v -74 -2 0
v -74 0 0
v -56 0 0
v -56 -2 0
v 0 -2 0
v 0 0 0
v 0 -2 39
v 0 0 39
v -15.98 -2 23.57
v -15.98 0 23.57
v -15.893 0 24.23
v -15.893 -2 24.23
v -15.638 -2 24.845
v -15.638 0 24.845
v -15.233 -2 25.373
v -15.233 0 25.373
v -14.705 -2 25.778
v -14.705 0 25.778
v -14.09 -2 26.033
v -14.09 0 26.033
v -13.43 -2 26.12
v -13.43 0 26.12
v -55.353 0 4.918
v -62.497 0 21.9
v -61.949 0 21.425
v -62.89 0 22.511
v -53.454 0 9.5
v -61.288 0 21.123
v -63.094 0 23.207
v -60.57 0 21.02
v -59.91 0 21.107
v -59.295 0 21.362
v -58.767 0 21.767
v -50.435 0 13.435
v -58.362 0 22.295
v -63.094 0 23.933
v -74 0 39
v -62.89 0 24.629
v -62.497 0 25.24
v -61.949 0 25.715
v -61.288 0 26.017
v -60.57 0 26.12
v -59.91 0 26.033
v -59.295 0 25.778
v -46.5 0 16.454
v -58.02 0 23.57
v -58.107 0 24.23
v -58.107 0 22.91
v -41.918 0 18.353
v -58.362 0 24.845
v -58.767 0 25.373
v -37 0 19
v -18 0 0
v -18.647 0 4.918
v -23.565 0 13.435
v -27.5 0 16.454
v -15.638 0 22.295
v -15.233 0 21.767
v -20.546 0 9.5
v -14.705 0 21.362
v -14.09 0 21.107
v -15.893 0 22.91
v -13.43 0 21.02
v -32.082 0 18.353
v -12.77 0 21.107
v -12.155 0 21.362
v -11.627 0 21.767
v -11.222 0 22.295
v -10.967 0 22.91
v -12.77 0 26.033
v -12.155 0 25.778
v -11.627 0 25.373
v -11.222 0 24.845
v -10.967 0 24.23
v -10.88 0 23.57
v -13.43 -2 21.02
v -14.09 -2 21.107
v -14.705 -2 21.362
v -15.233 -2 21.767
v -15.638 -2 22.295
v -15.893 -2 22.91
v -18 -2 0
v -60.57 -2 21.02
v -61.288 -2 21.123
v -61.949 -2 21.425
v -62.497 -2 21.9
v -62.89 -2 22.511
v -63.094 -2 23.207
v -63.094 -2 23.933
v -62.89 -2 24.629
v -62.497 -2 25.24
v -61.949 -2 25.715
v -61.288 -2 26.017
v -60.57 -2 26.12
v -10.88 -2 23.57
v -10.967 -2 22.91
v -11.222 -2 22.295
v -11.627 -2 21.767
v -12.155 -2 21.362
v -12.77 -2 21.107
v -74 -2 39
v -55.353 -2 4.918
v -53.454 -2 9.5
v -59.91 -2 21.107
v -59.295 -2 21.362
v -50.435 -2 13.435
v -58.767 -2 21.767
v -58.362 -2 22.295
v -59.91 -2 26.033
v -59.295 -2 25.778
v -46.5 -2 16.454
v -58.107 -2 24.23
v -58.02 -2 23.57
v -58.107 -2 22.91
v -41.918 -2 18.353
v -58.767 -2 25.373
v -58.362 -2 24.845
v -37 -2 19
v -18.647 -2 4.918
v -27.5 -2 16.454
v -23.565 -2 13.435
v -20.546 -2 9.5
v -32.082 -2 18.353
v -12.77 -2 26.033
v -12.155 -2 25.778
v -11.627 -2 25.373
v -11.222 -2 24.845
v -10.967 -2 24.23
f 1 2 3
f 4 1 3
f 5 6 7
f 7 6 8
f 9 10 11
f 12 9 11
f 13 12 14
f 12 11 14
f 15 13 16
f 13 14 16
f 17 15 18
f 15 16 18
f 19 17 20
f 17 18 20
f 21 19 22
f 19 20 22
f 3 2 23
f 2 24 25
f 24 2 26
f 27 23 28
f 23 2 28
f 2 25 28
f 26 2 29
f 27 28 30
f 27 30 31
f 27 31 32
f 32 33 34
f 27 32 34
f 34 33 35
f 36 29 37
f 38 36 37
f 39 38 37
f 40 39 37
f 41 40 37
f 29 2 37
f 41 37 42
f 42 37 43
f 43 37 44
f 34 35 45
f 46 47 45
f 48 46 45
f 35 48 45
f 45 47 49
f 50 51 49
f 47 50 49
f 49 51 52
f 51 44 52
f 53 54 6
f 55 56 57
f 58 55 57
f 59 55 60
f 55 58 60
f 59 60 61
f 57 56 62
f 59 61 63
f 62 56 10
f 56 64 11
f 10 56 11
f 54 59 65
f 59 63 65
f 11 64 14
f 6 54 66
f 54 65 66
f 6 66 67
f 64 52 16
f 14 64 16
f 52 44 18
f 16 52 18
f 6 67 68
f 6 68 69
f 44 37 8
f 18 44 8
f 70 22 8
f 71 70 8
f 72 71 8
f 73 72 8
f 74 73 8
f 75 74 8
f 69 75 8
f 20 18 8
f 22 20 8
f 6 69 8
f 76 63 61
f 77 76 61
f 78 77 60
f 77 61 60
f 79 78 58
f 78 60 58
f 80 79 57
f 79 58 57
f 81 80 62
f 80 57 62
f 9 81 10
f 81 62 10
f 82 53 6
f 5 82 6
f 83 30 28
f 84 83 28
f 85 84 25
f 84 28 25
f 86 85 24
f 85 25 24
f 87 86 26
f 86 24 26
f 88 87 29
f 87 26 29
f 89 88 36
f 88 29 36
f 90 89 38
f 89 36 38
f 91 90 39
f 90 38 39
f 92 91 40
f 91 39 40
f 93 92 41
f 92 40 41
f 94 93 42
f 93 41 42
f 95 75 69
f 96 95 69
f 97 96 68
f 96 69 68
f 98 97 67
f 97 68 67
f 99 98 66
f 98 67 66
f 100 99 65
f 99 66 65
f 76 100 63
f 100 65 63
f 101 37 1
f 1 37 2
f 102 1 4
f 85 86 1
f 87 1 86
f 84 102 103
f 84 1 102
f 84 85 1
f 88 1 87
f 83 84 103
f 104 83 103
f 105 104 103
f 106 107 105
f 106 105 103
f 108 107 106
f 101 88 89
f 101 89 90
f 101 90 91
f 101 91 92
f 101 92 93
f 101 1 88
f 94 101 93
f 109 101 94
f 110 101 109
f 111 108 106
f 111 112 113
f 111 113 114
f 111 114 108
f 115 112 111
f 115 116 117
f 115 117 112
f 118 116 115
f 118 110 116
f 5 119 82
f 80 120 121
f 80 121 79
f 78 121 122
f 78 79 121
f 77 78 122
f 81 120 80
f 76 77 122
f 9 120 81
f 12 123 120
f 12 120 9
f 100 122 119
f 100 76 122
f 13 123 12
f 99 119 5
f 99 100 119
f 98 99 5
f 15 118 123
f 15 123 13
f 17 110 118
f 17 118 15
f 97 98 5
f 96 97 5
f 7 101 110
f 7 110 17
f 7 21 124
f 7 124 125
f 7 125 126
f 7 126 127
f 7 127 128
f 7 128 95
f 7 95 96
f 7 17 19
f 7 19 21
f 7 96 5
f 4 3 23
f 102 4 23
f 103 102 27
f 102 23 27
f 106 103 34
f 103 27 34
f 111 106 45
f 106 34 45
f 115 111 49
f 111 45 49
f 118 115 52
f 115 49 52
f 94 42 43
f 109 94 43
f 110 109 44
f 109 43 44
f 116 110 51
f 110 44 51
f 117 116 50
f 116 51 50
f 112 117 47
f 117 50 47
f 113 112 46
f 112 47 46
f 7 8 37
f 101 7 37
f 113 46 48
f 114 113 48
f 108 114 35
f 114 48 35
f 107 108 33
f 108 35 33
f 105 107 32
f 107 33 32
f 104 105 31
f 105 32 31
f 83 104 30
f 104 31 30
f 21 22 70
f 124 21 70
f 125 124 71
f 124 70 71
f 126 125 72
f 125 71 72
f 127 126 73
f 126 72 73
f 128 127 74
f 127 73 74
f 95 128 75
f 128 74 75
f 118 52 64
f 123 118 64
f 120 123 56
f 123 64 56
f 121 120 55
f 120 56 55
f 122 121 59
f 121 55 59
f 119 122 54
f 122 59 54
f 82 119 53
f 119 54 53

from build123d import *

# Parameters (mm, degrees)
F1_DEPTH = 2


with BuildPart() as f1:
    # F0 (on Front) → F1 (new body)
    with BuildSketch(Plane.XZ):
        with BuildLine():
            Line((-13.43, 0), (0, 0))
            Line((0, 0), (0, 39))
            Line((0, 39), (-13.43, 39))
            Line((-13.43, 39), (-13.43, 26.12))
            ThreePointArc((-13.43, 26.12), (-11.626878, 25.373122), (-10.88, 23.57))
            ThreePointArc((-10.88, 23.57), (-11.626878, 21.766878), (-13.43, 21.02))
            Line((-13.43, 21.02), (-13.43, 0))
        make_face()
        with BuildLine():
            Line((-18, 0), (-13.43, 0))
            Line((-13.43, 0), (-13.43, 21.02))
            ThreePointArc((-13.43, 21.02), (-15.233122, 21.766878), (-15.98, 23.57))
            Line((-15.98, 23.57), (-58.02, 23.57))
            ThreePointArc((-58.02, 23.57), (-58.766878, 21.766878), (-60.57, 21.02))
            Line((-60.57, 21.02), (-60.57, 0))
            Line((-60.57, 0), (-56, 0))
            ThreePointArc((-56, 0), (-50.435029, 13.435029), (-37, 19))
            ThreePointArc((-37, 19), (-23.564971, 13.435029), (-18, 0))
        make_face()
        with BuildLine():
            Line((-13.43, 26.12), (-13.43, 39))
            Line((-13.43, 39), (-60.57, 39))
            Line((-60.57, 39), (-60.57, 26.12))
            ThreePointArc((-60.57, 26.12), (-58.766878, 25.373122), (-58.02, 23.57))
            Line((-58.02, 23.57), (-15.98, 23.57))
            ThreePointArc((-15.98, 23.57), (-15.233122, 25.373122), (-13.43, 26.12))
        make_face()
        with BuildLine():
            Line((-60.57, 26.12), (-60.57, 39))
            Line((-60.57, 39), (-74, 39))
            Line((-74, 39), (-74, 0))
            Line((-74, 0), (-60.57, 0))
            Line((-60.57, 0), (-60.57, 21.02))
            ThreePointArc((-60.57, 21.02), (-63.12, 23.57), (-60.57, 26.12))
        make_face()
    extrude(amount=F1_DEPTH)


solid = f1.part
